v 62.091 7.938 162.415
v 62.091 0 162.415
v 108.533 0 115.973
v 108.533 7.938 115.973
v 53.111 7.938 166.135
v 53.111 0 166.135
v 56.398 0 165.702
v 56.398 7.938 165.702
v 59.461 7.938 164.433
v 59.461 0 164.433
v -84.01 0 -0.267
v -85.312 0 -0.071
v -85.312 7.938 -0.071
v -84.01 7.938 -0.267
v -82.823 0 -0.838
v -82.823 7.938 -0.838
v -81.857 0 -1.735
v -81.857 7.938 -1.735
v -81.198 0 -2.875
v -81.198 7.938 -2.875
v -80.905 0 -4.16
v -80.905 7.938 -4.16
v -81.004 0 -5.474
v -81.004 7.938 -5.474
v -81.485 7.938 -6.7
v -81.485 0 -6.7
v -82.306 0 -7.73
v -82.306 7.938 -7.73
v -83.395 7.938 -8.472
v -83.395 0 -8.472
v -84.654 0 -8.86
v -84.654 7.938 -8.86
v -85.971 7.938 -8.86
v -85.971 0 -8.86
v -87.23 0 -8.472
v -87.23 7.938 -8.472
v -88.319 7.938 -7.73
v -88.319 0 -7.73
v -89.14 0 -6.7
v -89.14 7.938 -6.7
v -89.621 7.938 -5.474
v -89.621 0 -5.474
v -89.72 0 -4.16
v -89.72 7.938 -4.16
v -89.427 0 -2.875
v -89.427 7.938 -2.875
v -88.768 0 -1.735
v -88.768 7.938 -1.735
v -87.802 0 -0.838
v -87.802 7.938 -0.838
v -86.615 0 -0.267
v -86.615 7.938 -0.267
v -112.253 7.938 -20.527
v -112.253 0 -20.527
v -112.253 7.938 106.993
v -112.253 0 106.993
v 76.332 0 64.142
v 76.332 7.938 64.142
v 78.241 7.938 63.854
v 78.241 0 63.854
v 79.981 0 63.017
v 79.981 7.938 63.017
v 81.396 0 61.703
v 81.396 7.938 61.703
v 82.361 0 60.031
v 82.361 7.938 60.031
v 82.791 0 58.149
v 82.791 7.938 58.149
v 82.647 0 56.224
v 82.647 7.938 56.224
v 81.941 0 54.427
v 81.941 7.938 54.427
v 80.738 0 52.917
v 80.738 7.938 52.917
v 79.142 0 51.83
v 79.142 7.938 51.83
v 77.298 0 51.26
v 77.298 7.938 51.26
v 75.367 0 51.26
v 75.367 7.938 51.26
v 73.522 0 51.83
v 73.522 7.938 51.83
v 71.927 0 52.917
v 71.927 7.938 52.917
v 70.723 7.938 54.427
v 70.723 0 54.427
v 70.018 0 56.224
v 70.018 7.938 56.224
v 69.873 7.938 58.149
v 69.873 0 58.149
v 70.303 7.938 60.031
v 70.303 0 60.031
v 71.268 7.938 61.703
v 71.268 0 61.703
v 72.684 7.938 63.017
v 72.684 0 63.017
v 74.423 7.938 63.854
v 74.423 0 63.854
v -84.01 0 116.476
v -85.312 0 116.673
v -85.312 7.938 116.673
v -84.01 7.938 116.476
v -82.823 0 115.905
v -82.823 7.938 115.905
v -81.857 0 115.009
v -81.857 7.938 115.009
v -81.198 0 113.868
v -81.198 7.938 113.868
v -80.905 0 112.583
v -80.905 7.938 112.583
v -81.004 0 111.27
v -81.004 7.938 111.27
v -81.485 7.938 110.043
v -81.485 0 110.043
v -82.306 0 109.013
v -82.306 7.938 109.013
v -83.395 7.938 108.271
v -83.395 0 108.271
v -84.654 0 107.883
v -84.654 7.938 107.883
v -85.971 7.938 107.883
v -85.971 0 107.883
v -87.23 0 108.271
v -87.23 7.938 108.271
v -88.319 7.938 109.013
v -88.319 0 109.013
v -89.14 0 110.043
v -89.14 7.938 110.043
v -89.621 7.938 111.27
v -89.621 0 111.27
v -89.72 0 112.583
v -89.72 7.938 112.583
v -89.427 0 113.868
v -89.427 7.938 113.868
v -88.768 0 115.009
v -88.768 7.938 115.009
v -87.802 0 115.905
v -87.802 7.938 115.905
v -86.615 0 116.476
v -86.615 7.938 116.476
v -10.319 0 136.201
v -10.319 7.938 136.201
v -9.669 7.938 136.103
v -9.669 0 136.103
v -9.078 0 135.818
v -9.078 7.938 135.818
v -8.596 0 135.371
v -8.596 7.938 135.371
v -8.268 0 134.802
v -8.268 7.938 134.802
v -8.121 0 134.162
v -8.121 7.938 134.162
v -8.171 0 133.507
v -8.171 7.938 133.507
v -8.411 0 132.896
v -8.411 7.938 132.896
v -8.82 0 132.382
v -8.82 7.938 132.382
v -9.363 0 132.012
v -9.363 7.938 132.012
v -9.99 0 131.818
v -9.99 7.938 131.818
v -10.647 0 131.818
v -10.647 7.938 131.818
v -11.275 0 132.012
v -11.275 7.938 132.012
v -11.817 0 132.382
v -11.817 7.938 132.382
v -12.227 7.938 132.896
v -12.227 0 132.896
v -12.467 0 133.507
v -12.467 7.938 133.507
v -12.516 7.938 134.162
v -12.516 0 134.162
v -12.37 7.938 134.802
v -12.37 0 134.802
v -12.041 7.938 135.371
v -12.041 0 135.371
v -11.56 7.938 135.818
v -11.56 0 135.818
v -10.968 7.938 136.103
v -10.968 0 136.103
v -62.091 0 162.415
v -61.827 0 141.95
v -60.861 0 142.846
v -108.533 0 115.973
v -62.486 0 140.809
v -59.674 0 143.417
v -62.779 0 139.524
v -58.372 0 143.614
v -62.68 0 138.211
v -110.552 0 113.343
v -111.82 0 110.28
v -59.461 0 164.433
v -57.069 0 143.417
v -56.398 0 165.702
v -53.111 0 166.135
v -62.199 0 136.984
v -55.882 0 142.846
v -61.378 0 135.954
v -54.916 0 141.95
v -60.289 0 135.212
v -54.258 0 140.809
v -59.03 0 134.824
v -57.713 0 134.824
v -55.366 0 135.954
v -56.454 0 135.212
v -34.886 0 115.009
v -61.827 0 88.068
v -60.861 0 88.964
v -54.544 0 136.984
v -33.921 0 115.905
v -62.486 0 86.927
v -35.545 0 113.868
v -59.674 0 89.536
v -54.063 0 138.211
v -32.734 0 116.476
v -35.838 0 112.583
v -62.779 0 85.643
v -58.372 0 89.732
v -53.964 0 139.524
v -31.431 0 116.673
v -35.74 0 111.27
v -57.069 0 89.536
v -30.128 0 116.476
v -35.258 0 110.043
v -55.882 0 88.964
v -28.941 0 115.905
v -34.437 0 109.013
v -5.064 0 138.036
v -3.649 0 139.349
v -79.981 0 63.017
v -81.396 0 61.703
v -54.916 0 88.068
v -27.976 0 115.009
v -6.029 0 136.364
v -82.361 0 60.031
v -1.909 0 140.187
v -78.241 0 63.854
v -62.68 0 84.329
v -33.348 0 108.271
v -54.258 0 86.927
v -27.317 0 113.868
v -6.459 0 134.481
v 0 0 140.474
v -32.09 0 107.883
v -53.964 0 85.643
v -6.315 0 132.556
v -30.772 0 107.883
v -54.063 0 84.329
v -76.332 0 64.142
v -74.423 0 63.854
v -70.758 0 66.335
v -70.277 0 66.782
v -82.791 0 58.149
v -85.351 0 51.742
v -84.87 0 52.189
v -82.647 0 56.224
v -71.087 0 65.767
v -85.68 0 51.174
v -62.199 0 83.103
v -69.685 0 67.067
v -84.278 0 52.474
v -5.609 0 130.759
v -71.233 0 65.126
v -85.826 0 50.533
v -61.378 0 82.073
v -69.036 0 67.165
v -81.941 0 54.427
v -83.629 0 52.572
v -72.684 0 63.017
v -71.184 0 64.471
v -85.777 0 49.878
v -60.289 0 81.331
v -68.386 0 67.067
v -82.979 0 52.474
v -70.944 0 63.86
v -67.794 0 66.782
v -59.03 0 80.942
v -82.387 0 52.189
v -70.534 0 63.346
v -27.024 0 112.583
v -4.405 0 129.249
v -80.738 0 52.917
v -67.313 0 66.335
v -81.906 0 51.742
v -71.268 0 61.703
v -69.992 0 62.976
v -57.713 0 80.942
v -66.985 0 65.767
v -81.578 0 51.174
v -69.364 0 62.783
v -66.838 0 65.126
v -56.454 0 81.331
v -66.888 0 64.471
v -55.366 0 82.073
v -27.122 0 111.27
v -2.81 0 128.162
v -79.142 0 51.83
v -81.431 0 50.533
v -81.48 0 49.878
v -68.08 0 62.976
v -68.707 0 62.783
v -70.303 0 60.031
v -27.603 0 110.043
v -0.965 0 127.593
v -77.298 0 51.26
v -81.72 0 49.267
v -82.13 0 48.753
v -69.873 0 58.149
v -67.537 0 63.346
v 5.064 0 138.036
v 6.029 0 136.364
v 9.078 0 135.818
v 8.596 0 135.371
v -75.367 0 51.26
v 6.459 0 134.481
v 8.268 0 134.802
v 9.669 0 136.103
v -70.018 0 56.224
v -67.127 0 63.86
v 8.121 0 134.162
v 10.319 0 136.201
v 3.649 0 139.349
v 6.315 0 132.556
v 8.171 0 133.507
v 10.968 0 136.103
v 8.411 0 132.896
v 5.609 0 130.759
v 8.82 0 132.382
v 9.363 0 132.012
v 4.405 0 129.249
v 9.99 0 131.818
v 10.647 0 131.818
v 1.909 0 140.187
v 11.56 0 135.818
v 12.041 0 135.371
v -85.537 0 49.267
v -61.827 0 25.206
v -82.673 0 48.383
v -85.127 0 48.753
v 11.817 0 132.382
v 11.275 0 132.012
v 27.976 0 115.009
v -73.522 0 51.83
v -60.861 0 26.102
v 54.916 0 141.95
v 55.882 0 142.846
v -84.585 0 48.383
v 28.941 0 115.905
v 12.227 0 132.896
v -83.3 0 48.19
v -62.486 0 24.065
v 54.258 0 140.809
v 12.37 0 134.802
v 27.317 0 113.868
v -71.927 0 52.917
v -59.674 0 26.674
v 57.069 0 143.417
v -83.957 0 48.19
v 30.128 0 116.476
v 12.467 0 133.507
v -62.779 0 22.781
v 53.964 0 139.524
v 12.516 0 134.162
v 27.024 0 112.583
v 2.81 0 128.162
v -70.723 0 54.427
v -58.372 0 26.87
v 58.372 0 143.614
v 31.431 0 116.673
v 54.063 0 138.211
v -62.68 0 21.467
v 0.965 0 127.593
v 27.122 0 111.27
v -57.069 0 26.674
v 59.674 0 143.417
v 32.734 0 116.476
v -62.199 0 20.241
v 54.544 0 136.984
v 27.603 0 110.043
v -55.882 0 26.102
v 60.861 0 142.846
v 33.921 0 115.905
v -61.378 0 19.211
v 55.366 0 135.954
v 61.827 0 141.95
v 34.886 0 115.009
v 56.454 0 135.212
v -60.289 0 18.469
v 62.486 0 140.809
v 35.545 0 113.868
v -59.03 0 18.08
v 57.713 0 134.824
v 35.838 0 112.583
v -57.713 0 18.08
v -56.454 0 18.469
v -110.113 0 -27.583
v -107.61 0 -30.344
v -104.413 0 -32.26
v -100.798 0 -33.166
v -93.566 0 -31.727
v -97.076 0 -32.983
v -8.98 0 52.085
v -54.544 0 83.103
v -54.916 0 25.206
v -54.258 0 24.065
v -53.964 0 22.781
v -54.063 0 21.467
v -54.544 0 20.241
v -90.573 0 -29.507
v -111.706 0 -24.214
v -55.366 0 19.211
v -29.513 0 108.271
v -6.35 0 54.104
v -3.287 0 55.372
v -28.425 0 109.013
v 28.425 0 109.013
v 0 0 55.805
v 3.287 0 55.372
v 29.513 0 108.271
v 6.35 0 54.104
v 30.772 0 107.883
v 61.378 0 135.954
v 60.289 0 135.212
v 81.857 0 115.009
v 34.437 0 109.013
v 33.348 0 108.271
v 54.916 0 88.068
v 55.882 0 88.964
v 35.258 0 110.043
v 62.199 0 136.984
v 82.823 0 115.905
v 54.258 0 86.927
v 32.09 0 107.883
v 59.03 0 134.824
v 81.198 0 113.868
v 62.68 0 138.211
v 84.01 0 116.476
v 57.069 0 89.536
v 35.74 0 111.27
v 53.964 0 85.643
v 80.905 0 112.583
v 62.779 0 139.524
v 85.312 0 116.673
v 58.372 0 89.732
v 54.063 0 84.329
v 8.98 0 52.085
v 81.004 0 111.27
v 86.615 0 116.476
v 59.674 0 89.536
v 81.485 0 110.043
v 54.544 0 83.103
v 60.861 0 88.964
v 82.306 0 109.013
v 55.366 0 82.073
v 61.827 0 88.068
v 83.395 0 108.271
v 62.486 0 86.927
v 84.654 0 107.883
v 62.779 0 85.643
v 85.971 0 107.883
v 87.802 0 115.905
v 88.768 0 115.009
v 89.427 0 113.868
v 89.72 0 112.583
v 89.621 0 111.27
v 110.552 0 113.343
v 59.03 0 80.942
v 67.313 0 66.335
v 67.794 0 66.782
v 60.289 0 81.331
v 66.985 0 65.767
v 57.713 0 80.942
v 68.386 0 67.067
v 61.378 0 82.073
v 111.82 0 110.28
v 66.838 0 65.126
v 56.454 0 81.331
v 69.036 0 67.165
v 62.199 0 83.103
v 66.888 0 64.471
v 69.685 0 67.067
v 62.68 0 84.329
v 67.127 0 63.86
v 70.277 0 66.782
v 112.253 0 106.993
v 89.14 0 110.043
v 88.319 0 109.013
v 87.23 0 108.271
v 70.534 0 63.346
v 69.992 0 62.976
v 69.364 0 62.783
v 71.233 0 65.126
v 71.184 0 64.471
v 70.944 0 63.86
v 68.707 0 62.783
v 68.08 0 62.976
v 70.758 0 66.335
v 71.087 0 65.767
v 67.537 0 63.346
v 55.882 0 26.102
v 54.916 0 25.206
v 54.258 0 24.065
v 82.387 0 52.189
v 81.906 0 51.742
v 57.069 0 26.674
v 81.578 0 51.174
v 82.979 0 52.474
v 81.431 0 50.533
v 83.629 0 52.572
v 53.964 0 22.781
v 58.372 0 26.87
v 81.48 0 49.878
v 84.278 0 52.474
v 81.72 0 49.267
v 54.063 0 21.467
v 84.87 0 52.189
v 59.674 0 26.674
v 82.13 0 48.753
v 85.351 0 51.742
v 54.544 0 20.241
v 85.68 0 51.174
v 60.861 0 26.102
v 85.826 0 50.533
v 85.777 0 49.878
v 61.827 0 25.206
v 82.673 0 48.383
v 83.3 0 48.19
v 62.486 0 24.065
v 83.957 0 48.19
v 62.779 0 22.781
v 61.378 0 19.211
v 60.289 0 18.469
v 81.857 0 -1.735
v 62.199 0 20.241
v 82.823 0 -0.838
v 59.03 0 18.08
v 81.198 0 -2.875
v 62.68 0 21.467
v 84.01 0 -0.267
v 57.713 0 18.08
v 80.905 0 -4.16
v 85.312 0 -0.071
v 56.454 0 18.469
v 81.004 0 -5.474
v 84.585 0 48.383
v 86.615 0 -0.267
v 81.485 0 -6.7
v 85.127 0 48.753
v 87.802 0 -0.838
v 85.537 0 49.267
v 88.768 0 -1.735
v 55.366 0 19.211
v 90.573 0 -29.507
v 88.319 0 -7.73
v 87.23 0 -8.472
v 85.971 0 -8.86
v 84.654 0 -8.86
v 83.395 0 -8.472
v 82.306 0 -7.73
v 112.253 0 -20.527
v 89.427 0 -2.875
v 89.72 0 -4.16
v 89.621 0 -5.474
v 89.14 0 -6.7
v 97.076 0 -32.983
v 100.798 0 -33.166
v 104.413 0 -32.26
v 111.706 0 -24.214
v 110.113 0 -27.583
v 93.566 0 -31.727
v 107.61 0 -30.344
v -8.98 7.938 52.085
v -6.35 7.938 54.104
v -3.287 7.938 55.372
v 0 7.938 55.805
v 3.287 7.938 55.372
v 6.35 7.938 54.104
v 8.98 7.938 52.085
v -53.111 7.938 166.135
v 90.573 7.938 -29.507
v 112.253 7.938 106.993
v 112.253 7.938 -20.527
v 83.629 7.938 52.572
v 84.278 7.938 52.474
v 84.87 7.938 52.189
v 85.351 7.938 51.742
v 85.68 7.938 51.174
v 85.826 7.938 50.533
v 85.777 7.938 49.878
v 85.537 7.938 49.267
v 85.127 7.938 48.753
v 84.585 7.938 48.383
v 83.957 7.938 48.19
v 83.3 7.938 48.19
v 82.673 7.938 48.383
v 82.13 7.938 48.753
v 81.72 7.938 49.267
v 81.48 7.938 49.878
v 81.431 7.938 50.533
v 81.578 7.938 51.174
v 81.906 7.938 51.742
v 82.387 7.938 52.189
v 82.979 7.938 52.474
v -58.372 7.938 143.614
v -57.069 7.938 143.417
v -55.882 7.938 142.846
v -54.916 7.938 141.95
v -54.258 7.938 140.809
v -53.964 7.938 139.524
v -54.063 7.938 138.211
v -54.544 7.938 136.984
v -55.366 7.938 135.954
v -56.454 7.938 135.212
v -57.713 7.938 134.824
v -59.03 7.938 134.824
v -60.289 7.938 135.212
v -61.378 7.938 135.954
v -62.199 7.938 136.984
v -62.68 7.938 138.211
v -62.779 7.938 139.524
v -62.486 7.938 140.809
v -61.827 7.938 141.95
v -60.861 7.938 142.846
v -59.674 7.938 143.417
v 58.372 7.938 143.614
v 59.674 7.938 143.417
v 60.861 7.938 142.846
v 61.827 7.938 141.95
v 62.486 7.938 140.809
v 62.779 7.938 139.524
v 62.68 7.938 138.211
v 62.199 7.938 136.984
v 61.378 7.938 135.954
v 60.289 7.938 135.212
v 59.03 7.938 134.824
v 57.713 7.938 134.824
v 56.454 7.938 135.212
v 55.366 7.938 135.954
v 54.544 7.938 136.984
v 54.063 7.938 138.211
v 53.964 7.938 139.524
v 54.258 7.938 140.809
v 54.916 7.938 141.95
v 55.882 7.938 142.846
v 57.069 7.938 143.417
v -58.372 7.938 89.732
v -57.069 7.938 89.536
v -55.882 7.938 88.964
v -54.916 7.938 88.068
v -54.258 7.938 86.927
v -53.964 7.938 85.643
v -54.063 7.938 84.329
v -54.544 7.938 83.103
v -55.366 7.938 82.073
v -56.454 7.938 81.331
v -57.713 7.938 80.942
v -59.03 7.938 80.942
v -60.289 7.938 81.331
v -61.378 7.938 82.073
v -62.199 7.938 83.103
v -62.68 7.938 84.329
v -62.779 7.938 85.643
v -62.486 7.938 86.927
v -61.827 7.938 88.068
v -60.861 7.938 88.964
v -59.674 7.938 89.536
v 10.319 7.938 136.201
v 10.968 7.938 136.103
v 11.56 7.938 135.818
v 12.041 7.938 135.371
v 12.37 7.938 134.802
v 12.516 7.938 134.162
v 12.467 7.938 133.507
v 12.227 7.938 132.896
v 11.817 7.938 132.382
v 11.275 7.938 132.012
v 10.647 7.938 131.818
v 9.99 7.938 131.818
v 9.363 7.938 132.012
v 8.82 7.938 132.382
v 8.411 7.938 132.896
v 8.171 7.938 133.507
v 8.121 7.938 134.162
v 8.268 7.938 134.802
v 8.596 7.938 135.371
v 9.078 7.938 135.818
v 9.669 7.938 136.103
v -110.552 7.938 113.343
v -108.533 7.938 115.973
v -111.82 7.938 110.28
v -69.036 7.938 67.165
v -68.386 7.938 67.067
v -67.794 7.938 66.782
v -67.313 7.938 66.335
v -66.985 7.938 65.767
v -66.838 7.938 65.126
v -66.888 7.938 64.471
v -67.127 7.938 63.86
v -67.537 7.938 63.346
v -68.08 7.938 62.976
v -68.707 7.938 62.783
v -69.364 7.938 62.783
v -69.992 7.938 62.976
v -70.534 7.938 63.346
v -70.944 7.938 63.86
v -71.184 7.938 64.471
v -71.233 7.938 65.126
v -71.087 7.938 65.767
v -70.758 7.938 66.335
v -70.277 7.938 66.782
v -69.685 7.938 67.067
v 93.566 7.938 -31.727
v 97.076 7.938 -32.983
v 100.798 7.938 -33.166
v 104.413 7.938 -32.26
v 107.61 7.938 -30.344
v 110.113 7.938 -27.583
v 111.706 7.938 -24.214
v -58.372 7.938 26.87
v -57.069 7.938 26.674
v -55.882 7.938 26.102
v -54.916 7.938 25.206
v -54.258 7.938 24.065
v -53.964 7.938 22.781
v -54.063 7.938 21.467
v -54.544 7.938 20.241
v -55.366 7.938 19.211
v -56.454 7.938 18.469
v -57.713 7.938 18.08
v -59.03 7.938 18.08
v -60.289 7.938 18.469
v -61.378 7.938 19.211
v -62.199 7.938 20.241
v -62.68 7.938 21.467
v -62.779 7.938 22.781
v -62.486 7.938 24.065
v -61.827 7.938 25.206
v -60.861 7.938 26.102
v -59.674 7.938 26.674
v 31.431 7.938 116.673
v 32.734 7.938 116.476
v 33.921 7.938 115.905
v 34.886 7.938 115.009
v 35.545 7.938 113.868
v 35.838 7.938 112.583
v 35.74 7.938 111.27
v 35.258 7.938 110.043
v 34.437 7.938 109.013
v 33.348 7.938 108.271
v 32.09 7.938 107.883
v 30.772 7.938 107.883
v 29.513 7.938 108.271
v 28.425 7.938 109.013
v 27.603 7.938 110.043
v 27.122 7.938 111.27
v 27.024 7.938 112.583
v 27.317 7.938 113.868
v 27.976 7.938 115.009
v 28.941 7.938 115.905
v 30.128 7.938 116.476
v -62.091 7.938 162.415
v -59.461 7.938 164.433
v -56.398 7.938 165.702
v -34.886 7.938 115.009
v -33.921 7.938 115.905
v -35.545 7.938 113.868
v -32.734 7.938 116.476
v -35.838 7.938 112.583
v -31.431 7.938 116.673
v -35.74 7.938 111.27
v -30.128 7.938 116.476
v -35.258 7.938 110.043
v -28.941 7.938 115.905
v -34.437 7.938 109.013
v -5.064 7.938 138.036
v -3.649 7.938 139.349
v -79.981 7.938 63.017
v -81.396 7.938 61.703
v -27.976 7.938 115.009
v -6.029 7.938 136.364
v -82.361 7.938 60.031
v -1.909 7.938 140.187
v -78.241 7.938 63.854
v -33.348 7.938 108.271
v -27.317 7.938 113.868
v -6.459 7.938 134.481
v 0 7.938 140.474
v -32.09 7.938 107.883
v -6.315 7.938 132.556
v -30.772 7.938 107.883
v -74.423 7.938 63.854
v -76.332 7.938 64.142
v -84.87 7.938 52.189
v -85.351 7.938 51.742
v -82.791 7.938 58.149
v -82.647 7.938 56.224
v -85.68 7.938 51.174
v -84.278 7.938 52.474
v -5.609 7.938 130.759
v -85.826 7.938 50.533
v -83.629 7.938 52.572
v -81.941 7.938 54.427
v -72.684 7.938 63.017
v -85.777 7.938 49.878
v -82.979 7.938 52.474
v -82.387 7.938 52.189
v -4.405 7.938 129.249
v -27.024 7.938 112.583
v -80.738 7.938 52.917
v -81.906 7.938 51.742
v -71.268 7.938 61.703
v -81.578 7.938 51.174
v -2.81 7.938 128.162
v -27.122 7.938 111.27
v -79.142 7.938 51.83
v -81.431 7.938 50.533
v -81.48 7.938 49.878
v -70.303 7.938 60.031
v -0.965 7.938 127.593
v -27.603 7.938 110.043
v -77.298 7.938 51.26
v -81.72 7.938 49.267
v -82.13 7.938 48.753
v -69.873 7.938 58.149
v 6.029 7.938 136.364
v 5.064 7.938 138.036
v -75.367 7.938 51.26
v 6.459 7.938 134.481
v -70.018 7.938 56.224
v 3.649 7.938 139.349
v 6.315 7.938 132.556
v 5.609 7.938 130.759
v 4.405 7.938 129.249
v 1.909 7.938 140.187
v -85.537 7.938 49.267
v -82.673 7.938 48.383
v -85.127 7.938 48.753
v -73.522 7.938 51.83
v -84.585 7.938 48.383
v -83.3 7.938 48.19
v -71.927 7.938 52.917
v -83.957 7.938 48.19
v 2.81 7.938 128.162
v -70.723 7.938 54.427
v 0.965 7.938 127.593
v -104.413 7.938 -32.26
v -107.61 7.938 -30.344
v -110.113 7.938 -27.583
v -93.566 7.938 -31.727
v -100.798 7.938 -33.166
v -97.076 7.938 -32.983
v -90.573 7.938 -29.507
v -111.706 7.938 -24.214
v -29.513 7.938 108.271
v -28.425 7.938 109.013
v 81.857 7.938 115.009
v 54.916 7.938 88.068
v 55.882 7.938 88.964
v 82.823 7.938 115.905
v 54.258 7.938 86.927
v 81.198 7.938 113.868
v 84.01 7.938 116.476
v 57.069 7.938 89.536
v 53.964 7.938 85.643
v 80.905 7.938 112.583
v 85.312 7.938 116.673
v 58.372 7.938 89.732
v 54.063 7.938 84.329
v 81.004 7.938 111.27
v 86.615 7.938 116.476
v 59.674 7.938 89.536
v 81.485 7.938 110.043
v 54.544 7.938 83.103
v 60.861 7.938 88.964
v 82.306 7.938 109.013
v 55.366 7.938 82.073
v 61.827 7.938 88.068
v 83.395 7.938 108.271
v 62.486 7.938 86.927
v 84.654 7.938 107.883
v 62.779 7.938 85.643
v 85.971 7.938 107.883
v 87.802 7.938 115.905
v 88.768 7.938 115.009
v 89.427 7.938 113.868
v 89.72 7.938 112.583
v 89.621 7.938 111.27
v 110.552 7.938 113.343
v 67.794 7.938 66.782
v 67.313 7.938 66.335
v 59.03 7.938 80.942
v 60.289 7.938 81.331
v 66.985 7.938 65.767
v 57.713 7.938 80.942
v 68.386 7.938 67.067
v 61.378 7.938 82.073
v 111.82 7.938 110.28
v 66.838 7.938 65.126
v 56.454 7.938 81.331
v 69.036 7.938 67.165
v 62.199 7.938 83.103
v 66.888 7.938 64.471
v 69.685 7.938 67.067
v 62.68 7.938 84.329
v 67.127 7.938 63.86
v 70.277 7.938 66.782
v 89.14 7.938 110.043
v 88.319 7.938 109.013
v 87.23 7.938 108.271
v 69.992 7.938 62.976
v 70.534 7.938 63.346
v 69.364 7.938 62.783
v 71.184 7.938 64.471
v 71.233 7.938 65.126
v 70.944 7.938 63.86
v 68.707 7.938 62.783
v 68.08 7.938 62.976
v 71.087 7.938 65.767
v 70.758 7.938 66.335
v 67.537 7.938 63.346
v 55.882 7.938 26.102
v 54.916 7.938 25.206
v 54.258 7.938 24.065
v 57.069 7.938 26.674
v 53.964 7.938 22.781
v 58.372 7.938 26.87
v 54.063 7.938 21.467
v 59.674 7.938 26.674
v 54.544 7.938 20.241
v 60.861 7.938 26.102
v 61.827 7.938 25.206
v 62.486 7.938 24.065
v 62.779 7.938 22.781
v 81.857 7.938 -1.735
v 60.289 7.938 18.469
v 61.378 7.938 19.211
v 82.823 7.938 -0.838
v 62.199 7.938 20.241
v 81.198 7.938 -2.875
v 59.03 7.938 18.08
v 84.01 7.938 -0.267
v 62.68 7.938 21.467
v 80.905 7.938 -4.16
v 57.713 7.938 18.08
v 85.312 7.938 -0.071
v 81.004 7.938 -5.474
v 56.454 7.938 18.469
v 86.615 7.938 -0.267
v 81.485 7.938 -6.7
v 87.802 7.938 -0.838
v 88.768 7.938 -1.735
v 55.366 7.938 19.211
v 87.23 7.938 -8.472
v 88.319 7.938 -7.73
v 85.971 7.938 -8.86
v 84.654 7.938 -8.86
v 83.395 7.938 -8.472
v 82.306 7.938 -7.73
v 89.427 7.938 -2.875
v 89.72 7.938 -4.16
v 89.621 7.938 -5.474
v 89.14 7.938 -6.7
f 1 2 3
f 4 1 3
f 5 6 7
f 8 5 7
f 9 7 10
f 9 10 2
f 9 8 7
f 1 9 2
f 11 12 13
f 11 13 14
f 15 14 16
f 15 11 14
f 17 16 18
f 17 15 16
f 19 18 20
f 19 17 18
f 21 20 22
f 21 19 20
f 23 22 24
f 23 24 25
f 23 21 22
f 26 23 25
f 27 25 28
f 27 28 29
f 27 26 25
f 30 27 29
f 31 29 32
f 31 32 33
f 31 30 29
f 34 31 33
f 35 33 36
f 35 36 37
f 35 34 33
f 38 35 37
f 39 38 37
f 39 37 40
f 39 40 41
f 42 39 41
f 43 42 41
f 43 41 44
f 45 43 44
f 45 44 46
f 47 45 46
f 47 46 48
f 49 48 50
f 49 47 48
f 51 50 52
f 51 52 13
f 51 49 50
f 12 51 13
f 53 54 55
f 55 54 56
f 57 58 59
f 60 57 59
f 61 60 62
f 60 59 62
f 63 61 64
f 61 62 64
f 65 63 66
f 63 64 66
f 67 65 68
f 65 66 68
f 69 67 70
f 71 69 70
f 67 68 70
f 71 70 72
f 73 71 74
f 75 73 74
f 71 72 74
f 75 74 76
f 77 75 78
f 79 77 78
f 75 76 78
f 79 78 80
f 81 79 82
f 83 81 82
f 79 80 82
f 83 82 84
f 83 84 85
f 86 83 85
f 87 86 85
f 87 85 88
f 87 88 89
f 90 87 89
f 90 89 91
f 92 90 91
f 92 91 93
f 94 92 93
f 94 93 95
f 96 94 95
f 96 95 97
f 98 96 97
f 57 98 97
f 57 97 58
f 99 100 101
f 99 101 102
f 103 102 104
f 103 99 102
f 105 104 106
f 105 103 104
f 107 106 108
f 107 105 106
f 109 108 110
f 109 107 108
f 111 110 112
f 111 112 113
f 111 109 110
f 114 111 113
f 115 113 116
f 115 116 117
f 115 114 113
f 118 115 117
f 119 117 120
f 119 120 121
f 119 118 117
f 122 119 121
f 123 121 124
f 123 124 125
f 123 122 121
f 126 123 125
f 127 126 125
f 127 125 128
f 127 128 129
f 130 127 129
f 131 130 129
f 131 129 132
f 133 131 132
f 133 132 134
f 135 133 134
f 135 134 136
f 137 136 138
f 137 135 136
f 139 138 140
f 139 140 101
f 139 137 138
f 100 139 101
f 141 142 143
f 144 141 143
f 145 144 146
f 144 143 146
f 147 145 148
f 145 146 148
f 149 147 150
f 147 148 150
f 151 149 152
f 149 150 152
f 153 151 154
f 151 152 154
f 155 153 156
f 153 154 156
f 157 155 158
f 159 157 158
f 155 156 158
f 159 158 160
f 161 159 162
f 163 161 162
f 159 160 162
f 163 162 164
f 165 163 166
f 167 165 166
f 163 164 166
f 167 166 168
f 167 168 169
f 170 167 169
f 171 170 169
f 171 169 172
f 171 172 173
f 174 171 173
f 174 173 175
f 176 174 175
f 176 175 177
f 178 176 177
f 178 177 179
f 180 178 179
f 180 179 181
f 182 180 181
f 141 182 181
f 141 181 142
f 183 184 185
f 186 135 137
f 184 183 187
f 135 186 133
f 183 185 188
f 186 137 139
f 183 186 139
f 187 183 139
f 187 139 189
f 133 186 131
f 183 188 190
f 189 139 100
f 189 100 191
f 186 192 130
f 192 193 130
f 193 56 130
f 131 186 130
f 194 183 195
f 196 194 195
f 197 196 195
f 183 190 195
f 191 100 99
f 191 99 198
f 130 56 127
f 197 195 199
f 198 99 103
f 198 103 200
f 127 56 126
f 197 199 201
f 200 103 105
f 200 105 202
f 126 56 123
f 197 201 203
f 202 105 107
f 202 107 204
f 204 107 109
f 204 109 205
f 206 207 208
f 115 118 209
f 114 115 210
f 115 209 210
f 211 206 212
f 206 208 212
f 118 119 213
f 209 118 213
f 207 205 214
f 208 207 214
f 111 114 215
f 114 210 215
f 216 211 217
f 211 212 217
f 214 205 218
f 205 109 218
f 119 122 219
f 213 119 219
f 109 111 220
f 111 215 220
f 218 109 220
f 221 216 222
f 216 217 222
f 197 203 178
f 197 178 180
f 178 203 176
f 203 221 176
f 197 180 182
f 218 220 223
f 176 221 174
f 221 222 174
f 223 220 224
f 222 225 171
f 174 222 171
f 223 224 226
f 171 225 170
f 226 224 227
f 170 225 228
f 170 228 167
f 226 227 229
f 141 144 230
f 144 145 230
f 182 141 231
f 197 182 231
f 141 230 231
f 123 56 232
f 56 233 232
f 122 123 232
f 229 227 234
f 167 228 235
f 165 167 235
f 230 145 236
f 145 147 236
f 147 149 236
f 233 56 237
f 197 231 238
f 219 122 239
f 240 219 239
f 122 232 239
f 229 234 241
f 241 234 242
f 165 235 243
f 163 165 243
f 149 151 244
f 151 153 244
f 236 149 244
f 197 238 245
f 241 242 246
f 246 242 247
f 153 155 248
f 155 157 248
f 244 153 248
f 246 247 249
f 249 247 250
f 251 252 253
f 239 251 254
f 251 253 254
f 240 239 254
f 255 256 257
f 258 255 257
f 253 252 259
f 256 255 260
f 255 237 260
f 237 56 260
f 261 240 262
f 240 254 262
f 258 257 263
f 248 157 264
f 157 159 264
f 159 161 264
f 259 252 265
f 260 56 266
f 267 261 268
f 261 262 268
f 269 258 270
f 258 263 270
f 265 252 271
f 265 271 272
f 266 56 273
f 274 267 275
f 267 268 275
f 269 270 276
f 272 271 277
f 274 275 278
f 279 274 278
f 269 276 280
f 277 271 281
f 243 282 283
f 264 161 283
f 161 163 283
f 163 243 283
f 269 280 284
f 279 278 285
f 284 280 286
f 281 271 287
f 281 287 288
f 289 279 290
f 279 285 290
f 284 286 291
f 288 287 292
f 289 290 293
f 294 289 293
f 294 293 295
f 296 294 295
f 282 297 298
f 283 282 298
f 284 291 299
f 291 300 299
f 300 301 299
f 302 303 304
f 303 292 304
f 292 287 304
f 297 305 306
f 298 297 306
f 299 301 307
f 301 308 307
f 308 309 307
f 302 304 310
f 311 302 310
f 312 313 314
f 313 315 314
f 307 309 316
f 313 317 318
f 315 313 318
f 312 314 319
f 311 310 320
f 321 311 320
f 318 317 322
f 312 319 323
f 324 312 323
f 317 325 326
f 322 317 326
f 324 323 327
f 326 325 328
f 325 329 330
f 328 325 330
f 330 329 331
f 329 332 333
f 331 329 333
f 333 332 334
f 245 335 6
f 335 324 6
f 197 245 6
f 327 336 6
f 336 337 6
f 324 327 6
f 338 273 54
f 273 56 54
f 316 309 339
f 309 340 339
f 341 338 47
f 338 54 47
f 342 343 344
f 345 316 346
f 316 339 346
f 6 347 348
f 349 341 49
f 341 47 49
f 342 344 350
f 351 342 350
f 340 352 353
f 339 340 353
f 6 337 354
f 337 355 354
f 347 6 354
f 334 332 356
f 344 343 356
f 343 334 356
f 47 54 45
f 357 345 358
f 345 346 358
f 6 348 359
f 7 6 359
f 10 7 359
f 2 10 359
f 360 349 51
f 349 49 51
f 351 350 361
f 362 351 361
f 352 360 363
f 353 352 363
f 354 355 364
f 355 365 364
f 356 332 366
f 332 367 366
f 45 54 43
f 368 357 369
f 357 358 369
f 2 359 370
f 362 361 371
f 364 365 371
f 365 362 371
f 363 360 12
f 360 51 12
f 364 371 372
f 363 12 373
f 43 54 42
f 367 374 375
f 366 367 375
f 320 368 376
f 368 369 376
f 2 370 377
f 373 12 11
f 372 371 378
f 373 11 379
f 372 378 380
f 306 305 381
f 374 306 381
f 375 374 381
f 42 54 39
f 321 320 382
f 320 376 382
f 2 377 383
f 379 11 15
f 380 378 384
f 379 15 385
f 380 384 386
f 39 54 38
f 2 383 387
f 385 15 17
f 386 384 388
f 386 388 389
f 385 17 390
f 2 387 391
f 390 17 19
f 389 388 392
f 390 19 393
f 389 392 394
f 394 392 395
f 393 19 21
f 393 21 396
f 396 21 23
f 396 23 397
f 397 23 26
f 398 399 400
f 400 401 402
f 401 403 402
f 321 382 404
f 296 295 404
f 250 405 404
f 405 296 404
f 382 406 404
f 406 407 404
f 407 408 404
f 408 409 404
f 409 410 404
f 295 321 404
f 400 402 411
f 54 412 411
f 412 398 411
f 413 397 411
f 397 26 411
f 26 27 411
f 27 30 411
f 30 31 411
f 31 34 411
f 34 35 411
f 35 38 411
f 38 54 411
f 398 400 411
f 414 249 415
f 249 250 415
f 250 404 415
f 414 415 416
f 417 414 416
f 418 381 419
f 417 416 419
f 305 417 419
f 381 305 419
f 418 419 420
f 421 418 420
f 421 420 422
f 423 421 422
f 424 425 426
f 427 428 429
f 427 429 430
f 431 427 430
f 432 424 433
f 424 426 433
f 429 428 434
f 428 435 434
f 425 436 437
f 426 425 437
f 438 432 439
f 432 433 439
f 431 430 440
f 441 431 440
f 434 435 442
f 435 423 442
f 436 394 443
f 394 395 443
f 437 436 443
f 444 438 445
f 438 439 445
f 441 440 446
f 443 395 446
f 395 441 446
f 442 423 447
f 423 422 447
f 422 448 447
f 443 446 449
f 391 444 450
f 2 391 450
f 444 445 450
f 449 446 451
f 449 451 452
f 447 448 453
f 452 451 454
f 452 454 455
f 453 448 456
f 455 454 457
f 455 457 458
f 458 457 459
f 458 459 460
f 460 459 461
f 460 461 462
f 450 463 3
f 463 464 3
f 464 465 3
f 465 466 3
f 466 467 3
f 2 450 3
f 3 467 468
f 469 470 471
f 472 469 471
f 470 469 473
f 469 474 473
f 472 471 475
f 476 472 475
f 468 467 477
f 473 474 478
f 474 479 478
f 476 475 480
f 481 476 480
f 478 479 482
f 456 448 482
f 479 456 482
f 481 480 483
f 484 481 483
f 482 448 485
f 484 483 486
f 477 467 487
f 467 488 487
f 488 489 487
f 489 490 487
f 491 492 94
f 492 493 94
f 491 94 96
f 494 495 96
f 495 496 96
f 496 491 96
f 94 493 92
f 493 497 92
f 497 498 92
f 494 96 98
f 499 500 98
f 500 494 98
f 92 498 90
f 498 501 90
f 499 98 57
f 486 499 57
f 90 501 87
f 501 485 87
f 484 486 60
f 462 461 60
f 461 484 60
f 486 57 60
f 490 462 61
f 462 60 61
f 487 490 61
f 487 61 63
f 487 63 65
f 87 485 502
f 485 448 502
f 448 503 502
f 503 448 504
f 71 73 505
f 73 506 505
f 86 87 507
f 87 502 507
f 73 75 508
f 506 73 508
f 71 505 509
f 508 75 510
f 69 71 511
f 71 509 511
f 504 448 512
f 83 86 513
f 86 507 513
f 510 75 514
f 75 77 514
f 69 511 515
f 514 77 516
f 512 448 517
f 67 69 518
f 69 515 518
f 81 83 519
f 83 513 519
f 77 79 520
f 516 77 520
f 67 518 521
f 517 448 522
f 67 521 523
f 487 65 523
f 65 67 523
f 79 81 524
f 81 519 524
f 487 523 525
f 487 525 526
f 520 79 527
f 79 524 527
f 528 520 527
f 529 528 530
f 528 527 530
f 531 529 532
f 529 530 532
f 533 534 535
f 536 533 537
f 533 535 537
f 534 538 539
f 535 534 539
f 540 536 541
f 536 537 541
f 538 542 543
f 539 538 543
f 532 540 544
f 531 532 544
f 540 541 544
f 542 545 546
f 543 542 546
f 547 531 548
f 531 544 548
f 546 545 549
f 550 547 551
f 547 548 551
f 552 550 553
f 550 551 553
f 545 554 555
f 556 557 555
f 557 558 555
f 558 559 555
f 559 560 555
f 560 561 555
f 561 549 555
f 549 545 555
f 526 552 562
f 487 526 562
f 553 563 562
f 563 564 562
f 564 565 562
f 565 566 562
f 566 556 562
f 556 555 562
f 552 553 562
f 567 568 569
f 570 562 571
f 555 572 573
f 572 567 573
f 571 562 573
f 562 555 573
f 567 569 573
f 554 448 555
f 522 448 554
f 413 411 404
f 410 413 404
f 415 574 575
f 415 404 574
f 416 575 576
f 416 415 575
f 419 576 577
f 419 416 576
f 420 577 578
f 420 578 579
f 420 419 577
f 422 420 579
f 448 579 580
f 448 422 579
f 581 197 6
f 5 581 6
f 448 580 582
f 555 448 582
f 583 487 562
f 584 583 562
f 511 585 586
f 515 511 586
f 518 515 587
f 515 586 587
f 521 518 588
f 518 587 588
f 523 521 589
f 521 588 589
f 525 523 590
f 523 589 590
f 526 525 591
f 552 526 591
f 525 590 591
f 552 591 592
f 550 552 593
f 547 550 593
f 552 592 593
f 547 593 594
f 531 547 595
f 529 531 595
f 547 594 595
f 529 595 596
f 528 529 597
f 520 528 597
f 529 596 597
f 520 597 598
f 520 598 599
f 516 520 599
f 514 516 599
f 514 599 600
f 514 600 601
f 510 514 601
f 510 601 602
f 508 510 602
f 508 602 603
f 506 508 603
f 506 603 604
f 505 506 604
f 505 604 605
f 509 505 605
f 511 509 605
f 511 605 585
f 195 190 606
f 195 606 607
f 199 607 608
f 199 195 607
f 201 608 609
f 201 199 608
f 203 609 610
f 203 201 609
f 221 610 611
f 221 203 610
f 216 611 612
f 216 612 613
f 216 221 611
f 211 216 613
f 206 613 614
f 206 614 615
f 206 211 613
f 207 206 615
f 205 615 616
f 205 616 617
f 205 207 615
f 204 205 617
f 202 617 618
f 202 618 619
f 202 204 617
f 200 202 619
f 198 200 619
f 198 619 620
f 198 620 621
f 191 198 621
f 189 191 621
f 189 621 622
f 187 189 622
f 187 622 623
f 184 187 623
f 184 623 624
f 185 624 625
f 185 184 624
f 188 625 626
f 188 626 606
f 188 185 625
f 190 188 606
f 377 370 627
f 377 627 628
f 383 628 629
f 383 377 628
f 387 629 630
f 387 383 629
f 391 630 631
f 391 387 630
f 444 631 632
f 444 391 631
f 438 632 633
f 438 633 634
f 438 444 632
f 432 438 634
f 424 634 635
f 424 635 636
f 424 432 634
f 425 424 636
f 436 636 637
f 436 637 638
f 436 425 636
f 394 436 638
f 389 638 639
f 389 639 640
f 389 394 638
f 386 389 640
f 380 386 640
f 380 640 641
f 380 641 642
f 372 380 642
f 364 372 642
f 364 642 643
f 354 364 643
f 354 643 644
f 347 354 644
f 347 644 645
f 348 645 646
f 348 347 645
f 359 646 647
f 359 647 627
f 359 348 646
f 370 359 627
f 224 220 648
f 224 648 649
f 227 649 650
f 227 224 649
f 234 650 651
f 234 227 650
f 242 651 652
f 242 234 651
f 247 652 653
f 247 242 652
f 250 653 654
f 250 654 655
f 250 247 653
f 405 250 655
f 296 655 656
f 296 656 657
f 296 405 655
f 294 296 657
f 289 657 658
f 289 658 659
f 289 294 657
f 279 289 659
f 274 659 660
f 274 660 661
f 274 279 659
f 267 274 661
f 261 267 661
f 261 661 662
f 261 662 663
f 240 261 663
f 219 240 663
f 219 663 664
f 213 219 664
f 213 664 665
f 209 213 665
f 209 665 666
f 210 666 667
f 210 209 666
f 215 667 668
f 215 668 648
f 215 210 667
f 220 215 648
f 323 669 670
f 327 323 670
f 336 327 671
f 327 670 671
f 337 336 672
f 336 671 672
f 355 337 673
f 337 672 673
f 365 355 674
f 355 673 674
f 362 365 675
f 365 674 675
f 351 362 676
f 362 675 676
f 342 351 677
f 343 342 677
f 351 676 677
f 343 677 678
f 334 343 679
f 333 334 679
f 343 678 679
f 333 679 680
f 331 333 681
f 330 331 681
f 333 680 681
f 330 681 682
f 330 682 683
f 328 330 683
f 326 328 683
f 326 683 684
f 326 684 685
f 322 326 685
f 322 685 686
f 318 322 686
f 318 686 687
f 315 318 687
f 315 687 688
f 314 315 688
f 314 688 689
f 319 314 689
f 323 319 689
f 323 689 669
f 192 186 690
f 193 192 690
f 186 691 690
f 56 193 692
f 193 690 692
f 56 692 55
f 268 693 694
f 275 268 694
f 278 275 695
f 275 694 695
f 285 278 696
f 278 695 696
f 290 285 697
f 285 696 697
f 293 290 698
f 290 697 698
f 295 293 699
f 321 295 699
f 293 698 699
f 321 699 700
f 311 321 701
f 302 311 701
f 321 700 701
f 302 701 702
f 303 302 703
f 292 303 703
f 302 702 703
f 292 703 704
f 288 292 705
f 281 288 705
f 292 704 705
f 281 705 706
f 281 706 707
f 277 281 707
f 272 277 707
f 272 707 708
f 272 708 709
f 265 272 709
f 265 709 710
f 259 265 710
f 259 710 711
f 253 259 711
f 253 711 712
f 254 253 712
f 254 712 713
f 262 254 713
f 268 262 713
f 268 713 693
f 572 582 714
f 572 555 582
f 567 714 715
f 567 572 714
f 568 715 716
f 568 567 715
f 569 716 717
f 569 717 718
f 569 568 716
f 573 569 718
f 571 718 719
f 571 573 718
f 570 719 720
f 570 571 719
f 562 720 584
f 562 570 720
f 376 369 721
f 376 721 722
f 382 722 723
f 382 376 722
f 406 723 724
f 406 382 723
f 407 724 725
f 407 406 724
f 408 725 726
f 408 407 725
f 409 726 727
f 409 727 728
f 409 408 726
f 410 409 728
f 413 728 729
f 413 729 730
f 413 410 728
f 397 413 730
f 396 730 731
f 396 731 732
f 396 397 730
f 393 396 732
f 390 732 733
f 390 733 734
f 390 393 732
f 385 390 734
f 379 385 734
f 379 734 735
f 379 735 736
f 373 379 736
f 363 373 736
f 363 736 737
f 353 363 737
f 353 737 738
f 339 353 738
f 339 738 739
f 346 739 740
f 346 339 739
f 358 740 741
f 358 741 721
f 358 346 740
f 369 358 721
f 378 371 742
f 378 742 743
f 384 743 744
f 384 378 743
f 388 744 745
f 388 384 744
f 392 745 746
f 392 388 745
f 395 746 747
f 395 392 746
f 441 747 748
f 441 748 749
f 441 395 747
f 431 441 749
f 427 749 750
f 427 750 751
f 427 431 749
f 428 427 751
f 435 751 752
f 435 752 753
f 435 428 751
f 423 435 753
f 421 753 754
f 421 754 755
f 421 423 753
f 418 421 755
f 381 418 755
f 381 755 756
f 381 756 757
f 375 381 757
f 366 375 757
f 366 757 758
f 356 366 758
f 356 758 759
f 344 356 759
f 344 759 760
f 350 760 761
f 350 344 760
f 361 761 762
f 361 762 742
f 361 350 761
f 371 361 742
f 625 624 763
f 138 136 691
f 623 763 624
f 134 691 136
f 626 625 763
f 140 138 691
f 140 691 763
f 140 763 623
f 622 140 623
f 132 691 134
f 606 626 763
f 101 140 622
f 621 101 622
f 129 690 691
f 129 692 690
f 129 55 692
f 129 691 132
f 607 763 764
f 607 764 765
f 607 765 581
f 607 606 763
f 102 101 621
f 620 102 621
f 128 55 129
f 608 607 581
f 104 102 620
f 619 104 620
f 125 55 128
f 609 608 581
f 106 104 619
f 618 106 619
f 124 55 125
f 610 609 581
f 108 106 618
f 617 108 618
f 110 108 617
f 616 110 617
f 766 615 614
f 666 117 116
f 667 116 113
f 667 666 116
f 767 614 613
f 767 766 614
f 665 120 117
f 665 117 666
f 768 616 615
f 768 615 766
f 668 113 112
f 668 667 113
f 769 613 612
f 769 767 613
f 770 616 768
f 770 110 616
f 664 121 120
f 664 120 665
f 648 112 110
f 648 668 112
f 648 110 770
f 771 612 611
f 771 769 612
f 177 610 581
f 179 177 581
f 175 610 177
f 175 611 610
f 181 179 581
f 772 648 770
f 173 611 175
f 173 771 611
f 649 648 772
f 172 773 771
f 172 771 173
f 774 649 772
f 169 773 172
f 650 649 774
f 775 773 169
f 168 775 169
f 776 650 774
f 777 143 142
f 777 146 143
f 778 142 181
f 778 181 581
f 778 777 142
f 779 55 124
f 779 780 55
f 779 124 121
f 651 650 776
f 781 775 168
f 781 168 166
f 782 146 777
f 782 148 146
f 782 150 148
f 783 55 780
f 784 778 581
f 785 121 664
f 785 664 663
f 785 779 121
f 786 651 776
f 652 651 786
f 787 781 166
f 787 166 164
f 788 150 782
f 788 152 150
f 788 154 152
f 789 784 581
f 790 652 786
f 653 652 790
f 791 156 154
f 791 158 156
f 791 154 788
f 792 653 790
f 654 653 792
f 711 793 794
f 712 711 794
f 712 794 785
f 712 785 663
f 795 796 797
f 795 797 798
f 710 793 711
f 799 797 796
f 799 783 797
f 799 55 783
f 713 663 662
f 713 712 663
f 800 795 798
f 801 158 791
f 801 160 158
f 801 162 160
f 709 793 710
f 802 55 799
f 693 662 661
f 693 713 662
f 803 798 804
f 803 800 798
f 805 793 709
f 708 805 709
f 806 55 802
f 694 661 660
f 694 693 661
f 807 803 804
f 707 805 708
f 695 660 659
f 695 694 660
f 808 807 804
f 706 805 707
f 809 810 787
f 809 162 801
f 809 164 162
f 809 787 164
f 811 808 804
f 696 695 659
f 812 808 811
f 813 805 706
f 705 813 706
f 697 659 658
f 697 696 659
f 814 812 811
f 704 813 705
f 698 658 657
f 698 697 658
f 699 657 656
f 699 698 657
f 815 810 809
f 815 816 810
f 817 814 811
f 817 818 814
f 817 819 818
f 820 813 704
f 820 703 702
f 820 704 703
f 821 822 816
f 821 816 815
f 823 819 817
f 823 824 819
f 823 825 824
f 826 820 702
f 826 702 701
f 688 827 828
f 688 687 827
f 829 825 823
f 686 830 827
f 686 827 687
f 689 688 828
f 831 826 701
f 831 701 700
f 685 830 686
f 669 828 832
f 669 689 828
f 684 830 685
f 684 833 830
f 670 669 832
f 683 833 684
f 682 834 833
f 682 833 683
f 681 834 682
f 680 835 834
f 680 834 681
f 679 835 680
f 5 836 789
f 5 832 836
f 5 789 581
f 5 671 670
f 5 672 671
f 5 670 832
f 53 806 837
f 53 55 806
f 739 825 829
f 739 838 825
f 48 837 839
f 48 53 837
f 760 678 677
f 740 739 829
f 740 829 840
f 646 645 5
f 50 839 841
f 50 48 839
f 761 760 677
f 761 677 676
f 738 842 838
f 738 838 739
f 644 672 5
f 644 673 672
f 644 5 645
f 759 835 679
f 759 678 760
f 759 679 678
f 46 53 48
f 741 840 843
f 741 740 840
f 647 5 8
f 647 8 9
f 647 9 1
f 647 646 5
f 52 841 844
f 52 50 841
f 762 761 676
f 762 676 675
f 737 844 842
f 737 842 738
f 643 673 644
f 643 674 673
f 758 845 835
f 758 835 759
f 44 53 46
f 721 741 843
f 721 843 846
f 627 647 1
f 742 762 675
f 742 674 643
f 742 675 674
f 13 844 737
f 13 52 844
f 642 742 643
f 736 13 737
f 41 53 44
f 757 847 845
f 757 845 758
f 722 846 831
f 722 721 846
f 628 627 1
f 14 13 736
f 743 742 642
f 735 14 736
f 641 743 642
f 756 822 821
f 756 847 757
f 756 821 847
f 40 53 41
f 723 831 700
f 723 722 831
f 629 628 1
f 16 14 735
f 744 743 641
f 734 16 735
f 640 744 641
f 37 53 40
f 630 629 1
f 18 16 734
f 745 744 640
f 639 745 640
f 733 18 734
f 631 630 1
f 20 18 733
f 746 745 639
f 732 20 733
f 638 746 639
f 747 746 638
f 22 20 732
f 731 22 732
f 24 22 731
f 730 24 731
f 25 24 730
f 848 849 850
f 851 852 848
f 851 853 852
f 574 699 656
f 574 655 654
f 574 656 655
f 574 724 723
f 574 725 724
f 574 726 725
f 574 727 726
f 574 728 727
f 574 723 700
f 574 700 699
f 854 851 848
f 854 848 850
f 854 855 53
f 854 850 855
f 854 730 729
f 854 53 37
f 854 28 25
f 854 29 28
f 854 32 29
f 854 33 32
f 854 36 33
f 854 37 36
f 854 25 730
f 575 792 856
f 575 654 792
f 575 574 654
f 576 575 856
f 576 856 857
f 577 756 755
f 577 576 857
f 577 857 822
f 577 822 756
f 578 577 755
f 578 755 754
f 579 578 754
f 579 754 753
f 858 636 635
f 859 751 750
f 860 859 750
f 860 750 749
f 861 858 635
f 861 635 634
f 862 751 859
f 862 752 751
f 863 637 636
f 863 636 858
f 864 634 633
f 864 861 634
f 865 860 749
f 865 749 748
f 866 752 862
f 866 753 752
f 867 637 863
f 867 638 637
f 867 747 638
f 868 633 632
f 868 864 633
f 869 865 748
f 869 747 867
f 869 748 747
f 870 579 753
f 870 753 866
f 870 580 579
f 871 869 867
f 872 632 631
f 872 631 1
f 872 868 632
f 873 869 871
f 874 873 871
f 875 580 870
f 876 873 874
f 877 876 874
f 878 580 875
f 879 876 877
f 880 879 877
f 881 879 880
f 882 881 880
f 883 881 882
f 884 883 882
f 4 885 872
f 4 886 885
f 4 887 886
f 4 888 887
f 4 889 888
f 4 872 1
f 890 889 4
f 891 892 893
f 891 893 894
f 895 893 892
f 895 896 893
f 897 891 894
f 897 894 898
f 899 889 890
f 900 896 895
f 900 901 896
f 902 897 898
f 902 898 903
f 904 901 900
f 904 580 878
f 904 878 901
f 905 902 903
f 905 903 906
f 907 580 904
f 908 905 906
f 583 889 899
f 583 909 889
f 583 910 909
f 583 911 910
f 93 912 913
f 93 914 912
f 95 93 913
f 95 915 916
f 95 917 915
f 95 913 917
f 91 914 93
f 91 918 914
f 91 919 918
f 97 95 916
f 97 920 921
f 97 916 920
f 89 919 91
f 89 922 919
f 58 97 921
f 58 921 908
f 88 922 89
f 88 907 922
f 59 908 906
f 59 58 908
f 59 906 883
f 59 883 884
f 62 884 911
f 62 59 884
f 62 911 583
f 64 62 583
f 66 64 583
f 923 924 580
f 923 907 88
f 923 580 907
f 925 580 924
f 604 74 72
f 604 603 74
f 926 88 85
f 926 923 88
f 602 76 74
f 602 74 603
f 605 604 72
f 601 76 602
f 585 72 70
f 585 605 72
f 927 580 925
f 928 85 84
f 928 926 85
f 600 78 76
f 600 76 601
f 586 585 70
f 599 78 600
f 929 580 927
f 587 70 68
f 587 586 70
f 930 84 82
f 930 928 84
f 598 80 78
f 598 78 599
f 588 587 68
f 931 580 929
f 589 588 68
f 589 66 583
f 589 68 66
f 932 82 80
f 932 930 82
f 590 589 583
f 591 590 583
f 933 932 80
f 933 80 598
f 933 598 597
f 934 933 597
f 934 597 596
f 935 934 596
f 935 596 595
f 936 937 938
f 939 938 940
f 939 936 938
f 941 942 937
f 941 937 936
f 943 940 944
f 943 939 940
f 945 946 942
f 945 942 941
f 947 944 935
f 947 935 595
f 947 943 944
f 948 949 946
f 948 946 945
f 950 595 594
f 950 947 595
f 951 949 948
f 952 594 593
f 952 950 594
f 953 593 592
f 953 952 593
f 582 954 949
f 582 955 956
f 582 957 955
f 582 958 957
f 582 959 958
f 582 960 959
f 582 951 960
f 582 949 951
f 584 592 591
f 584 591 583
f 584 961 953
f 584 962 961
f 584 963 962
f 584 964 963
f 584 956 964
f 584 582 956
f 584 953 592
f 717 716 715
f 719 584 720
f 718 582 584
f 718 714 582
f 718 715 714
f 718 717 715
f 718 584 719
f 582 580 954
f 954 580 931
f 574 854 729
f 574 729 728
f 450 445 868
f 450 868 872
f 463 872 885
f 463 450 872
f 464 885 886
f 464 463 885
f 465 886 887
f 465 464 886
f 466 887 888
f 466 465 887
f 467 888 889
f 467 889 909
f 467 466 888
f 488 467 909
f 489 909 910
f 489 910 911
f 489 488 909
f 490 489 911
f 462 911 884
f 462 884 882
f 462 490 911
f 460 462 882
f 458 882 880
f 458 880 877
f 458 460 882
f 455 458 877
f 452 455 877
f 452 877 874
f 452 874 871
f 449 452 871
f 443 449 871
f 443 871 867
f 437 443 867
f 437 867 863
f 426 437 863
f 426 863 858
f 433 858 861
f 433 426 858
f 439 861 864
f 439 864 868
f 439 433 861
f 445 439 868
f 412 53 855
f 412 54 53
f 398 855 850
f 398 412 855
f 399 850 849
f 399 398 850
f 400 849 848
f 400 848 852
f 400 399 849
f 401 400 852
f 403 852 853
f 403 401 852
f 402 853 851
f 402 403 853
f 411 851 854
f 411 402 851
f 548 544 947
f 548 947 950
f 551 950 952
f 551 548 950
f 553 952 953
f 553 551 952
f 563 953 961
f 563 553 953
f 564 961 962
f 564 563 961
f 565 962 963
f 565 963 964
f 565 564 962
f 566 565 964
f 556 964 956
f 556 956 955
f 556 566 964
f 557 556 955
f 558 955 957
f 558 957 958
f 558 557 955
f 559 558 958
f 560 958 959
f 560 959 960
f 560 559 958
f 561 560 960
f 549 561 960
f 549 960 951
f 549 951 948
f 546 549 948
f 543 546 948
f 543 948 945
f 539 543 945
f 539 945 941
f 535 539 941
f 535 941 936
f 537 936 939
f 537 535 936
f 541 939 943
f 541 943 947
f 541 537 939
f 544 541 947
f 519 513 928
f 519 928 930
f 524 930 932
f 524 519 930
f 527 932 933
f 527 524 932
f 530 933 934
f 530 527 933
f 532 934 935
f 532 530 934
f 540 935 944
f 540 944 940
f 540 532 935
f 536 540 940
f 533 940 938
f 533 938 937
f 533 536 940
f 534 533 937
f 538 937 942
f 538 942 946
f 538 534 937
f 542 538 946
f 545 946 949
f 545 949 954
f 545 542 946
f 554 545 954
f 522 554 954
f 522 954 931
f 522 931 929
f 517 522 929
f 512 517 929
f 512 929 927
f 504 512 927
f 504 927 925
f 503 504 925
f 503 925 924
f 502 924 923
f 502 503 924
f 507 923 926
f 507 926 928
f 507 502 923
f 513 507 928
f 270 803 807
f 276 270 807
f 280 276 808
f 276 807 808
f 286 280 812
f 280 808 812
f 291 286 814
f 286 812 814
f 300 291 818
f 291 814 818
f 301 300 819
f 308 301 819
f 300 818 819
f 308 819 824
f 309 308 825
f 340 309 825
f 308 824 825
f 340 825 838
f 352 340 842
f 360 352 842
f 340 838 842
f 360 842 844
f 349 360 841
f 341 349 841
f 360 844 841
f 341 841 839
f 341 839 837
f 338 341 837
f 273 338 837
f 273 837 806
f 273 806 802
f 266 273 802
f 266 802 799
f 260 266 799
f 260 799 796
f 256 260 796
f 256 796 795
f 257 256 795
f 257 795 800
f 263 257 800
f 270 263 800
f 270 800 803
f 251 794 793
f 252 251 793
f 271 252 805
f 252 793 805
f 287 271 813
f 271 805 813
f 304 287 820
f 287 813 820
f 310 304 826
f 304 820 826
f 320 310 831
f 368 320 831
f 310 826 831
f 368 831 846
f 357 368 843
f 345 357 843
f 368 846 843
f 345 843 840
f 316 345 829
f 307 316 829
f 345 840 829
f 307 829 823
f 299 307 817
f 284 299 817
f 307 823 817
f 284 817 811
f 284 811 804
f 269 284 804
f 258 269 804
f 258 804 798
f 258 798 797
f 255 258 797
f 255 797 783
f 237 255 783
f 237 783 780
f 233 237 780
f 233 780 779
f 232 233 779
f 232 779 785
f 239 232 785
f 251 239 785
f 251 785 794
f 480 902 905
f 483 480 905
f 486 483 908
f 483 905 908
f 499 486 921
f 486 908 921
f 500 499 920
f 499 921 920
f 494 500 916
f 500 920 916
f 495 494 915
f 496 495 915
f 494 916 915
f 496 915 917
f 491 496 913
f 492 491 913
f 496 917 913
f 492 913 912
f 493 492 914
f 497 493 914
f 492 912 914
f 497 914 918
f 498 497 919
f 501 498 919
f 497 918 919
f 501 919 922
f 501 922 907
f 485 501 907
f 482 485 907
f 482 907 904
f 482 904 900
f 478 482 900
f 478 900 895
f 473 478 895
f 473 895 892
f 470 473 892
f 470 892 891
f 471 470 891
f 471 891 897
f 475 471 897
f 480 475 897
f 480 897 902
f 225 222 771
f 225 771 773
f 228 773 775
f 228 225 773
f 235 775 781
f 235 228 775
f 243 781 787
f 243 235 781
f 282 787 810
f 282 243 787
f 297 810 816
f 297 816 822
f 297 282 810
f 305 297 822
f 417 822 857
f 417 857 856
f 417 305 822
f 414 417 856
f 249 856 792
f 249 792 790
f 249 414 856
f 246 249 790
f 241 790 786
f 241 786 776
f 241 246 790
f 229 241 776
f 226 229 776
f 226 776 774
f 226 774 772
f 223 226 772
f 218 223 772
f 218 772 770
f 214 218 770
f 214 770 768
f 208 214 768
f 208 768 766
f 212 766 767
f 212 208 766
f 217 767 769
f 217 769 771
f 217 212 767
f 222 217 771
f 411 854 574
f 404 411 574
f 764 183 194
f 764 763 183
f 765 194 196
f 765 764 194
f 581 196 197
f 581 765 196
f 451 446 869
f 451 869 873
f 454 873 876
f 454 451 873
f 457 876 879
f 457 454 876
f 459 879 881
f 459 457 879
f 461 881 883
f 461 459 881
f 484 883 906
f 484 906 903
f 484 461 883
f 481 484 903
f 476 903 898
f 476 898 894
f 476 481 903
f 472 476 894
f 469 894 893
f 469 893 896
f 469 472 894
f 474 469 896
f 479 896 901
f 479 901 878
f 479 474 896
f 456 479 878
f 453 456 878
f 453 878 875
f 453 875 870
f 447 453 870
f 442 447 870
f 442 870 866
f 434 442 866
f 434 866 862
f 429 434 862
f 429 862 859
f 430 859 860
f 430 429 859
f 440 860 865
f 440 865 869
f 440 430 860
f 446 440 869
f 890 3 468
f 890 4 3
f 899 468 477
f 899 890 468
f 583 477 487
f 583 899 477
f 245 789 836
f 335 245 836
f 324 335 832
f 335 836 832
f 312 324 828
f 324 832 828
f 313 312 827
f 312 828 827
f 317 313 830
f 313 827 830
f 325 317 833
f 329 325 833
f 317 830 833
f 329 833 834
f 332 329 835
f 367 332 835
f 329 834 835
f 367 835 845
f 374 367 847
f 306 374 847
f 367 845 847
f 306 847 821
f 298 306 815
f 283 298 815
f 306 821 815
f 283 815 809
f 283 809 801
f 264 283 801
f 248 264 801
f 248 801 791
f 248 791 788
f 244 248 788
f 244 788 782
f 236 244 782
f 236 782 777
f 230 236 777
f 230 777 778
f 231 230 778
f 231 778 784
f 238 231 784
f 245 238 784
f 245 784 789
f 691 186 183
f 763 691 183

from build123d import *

# Parameters (mm, degrees)
SKETCH1_R           = 4.4196
BOSS_EXTRUDE1_DEPTH = 7.9375
CUT_EXTRUDE1_DEPTH  = 201.660251187
FILLET1_R           = 12.7
SKETCH3_R           = 6.477
SKETCH3_R_2         = 2.20345
CUT_EXTRUDE2_DEPTH  = 201.660251187


with BuildPart() as part:
    # Sketch1 → Boss-Extrude1 (new body)
    with BuildSketch(Plane(origin=(0, 0, 0), x_dir=(1, 0, 0), z_dir=(0, 1, 0))):
        Polygon((-112.253201513, -112.253201513), (-58.371664787, -166.13473824), (58.371664787, -166.13473824), (112.253201513, -112.253201513), (112.253201513, 58.371664787), (0, -53.881536726), (-112.253201513, 58.371664787), align=None)
        with Locations(Location((-85.31243315, -112.253201513, 0), (0, 0, 270))):
            Circle(SKETCH1_R, mode=Mode.SUBTRACT)
        with Locations(Location((-58.371664787, -85.31243315, 0), (0, 0, 270))):
            Circle(SKETCH1_R, mode=Mode.SUBTRACT)
        with Locations(Location((-31.430896424, -112.253201513, 0), (0, 0, 270))):
            Circle(SKETCH1_R, mode=Mode.SUBTRACT)
        with Locations(Location((-58.371664787, -139.193969877, 0), (0, 0, 270))):
            Circle(SKETCH1_R, mode=Mode.SUBTRACT)
        with Locations(Location((31.430896424, -112.253201513, 0), (0, 0, 270))):
            Circle(SKETCH1_R, mode=Mode.SUBTRACT)
        with Locations(Location((58.371664787, -85.31243315, 0), (0, 0, 270))):
            Circle(SKETCH1_R, mode=Mode.SUBTRACT)
        with Locations(Location((85.31243315, -112.253201513, 0), (0, 0, 270))):
            Circle(SKETCH1_R, mode=Mode.SUBTRACT)
        with Locations(Location((58.371664787, -139.193969877, 0), (0, 0, 270))):
            Circle(SKETCH1_R, mode=Mode.SUBTRACT)
        with Locations(Location((-85.31243315, 4.490128061, 0), (0, 0, 270))):
            Circle(SKETCH1_R, mode=Mode.SUBTRACT)
        with Locations(Location((-58.371664787, -22.450640303, 0), (0, 0, 270))):
            Circle(SKETCH1_R, mode=Mode.SUBTRACT)
        with Locations(Location((58.371664787, -22.450640303, 0), (0, 0, 270))):
            Circle(SKETCH1_R, mode=Mode.SUBTRACT)
        with Locations(Location((85.31243315, 4.490128061, 0), (0, 0, 270))):
            Circle(SKETCH1_R, mode=Mode.SUBTRACT)
    extrude(amount=BOSS_EXTRUDE1_DEPTH)

    # Sketch2 → Cut-Extrude1 (cut, through all)
    with BuildSketch(Plane(origin=(0, 7.9375, 0), x_dir=(1, 0, 0), z_dir=(0, 1, 0))):
        Polygon((0, -53.881536726), (-112.253201513, 58.371664787), (-112.253201513, 51.18745989), (0, -61.065741623), (112.253201513, 51.18745989), (112.253201513, 58.371664787), align=None)
    extrude(amount=-CUT_EXTRUDE1_DEPTH, mode=Mode.SUBTRACT)

    # Fillet1
    fillet1_edges = [part.edges().sort_by_distance(p)[0] for p in [
        (112.253201513, 3.96875, 112.253201513),
        (58.371664787, 3.96875, 166.13473824),
        (-58.371664787, 3.96875, 166.13473824),
        (-112.253201513, 3.96875, 112.253201513),
        (0, 3.96875, 61.065741623),
        (-112.253201513, 3.96875, -51.18745989),
        (112.253201513, 3.96875, -51.18745989),
    ]]
    fillet(fillet1_edges, radius=FILLET1_R)

    # Sketch3 → Cut-Extrude2 (cut, through all)
    with BuildSketch(Plane(origin=(0, 7.9375, 0), x_dir=(1, 0, 0), z_dir=(0, 1, 0))):
        with Locations(Location((0, -133.99727835, 0), (0, 0, 270))):
            Circle(SKETCH3_R)
        with Locations(Location((-10.31875, -133.99727835, 0), (0, 0, 270))):
            Circle(SKETCH3_R_2)
        with Locations(Location((10.31875, -133.99727835, 0), (0, 0, 270))):
            Circle(SKETCH3_R_2)
        with Locations(Location((-76.332177029, -57.665101321, 0), (0, 0, 270))):
            Circle(SKETCH3_R)
        with Locations(Location((-69.035718931, -64.961559419, 0), (0, 0, 270))):
            Circle(SKETCH3_R_2)
        with Locations(Location((-83.628635127, -50.368643222, 0), (0, 0, 270))):
            Circle(SKETCH3_R_2)
        with Locations(Location((76.332177029, -57.665101321, 0), (0, 0, 270))):
            Circle(SKETCH3_R)
        with Locations(Location((69.035718931, -64.961559419, 0), (0, 0, 270))):
            Circle(SKETCH3_R_2)
        with Locations(Location((83.628635127, -50.368643222, 0), (0, 0, 270))):
            Circle(SKETCH3_R_2)
    extrude(amount=-CUT_EXTRUDE2_DEPTH, mode=Mode.SUBTRACT)


solid = part.part
